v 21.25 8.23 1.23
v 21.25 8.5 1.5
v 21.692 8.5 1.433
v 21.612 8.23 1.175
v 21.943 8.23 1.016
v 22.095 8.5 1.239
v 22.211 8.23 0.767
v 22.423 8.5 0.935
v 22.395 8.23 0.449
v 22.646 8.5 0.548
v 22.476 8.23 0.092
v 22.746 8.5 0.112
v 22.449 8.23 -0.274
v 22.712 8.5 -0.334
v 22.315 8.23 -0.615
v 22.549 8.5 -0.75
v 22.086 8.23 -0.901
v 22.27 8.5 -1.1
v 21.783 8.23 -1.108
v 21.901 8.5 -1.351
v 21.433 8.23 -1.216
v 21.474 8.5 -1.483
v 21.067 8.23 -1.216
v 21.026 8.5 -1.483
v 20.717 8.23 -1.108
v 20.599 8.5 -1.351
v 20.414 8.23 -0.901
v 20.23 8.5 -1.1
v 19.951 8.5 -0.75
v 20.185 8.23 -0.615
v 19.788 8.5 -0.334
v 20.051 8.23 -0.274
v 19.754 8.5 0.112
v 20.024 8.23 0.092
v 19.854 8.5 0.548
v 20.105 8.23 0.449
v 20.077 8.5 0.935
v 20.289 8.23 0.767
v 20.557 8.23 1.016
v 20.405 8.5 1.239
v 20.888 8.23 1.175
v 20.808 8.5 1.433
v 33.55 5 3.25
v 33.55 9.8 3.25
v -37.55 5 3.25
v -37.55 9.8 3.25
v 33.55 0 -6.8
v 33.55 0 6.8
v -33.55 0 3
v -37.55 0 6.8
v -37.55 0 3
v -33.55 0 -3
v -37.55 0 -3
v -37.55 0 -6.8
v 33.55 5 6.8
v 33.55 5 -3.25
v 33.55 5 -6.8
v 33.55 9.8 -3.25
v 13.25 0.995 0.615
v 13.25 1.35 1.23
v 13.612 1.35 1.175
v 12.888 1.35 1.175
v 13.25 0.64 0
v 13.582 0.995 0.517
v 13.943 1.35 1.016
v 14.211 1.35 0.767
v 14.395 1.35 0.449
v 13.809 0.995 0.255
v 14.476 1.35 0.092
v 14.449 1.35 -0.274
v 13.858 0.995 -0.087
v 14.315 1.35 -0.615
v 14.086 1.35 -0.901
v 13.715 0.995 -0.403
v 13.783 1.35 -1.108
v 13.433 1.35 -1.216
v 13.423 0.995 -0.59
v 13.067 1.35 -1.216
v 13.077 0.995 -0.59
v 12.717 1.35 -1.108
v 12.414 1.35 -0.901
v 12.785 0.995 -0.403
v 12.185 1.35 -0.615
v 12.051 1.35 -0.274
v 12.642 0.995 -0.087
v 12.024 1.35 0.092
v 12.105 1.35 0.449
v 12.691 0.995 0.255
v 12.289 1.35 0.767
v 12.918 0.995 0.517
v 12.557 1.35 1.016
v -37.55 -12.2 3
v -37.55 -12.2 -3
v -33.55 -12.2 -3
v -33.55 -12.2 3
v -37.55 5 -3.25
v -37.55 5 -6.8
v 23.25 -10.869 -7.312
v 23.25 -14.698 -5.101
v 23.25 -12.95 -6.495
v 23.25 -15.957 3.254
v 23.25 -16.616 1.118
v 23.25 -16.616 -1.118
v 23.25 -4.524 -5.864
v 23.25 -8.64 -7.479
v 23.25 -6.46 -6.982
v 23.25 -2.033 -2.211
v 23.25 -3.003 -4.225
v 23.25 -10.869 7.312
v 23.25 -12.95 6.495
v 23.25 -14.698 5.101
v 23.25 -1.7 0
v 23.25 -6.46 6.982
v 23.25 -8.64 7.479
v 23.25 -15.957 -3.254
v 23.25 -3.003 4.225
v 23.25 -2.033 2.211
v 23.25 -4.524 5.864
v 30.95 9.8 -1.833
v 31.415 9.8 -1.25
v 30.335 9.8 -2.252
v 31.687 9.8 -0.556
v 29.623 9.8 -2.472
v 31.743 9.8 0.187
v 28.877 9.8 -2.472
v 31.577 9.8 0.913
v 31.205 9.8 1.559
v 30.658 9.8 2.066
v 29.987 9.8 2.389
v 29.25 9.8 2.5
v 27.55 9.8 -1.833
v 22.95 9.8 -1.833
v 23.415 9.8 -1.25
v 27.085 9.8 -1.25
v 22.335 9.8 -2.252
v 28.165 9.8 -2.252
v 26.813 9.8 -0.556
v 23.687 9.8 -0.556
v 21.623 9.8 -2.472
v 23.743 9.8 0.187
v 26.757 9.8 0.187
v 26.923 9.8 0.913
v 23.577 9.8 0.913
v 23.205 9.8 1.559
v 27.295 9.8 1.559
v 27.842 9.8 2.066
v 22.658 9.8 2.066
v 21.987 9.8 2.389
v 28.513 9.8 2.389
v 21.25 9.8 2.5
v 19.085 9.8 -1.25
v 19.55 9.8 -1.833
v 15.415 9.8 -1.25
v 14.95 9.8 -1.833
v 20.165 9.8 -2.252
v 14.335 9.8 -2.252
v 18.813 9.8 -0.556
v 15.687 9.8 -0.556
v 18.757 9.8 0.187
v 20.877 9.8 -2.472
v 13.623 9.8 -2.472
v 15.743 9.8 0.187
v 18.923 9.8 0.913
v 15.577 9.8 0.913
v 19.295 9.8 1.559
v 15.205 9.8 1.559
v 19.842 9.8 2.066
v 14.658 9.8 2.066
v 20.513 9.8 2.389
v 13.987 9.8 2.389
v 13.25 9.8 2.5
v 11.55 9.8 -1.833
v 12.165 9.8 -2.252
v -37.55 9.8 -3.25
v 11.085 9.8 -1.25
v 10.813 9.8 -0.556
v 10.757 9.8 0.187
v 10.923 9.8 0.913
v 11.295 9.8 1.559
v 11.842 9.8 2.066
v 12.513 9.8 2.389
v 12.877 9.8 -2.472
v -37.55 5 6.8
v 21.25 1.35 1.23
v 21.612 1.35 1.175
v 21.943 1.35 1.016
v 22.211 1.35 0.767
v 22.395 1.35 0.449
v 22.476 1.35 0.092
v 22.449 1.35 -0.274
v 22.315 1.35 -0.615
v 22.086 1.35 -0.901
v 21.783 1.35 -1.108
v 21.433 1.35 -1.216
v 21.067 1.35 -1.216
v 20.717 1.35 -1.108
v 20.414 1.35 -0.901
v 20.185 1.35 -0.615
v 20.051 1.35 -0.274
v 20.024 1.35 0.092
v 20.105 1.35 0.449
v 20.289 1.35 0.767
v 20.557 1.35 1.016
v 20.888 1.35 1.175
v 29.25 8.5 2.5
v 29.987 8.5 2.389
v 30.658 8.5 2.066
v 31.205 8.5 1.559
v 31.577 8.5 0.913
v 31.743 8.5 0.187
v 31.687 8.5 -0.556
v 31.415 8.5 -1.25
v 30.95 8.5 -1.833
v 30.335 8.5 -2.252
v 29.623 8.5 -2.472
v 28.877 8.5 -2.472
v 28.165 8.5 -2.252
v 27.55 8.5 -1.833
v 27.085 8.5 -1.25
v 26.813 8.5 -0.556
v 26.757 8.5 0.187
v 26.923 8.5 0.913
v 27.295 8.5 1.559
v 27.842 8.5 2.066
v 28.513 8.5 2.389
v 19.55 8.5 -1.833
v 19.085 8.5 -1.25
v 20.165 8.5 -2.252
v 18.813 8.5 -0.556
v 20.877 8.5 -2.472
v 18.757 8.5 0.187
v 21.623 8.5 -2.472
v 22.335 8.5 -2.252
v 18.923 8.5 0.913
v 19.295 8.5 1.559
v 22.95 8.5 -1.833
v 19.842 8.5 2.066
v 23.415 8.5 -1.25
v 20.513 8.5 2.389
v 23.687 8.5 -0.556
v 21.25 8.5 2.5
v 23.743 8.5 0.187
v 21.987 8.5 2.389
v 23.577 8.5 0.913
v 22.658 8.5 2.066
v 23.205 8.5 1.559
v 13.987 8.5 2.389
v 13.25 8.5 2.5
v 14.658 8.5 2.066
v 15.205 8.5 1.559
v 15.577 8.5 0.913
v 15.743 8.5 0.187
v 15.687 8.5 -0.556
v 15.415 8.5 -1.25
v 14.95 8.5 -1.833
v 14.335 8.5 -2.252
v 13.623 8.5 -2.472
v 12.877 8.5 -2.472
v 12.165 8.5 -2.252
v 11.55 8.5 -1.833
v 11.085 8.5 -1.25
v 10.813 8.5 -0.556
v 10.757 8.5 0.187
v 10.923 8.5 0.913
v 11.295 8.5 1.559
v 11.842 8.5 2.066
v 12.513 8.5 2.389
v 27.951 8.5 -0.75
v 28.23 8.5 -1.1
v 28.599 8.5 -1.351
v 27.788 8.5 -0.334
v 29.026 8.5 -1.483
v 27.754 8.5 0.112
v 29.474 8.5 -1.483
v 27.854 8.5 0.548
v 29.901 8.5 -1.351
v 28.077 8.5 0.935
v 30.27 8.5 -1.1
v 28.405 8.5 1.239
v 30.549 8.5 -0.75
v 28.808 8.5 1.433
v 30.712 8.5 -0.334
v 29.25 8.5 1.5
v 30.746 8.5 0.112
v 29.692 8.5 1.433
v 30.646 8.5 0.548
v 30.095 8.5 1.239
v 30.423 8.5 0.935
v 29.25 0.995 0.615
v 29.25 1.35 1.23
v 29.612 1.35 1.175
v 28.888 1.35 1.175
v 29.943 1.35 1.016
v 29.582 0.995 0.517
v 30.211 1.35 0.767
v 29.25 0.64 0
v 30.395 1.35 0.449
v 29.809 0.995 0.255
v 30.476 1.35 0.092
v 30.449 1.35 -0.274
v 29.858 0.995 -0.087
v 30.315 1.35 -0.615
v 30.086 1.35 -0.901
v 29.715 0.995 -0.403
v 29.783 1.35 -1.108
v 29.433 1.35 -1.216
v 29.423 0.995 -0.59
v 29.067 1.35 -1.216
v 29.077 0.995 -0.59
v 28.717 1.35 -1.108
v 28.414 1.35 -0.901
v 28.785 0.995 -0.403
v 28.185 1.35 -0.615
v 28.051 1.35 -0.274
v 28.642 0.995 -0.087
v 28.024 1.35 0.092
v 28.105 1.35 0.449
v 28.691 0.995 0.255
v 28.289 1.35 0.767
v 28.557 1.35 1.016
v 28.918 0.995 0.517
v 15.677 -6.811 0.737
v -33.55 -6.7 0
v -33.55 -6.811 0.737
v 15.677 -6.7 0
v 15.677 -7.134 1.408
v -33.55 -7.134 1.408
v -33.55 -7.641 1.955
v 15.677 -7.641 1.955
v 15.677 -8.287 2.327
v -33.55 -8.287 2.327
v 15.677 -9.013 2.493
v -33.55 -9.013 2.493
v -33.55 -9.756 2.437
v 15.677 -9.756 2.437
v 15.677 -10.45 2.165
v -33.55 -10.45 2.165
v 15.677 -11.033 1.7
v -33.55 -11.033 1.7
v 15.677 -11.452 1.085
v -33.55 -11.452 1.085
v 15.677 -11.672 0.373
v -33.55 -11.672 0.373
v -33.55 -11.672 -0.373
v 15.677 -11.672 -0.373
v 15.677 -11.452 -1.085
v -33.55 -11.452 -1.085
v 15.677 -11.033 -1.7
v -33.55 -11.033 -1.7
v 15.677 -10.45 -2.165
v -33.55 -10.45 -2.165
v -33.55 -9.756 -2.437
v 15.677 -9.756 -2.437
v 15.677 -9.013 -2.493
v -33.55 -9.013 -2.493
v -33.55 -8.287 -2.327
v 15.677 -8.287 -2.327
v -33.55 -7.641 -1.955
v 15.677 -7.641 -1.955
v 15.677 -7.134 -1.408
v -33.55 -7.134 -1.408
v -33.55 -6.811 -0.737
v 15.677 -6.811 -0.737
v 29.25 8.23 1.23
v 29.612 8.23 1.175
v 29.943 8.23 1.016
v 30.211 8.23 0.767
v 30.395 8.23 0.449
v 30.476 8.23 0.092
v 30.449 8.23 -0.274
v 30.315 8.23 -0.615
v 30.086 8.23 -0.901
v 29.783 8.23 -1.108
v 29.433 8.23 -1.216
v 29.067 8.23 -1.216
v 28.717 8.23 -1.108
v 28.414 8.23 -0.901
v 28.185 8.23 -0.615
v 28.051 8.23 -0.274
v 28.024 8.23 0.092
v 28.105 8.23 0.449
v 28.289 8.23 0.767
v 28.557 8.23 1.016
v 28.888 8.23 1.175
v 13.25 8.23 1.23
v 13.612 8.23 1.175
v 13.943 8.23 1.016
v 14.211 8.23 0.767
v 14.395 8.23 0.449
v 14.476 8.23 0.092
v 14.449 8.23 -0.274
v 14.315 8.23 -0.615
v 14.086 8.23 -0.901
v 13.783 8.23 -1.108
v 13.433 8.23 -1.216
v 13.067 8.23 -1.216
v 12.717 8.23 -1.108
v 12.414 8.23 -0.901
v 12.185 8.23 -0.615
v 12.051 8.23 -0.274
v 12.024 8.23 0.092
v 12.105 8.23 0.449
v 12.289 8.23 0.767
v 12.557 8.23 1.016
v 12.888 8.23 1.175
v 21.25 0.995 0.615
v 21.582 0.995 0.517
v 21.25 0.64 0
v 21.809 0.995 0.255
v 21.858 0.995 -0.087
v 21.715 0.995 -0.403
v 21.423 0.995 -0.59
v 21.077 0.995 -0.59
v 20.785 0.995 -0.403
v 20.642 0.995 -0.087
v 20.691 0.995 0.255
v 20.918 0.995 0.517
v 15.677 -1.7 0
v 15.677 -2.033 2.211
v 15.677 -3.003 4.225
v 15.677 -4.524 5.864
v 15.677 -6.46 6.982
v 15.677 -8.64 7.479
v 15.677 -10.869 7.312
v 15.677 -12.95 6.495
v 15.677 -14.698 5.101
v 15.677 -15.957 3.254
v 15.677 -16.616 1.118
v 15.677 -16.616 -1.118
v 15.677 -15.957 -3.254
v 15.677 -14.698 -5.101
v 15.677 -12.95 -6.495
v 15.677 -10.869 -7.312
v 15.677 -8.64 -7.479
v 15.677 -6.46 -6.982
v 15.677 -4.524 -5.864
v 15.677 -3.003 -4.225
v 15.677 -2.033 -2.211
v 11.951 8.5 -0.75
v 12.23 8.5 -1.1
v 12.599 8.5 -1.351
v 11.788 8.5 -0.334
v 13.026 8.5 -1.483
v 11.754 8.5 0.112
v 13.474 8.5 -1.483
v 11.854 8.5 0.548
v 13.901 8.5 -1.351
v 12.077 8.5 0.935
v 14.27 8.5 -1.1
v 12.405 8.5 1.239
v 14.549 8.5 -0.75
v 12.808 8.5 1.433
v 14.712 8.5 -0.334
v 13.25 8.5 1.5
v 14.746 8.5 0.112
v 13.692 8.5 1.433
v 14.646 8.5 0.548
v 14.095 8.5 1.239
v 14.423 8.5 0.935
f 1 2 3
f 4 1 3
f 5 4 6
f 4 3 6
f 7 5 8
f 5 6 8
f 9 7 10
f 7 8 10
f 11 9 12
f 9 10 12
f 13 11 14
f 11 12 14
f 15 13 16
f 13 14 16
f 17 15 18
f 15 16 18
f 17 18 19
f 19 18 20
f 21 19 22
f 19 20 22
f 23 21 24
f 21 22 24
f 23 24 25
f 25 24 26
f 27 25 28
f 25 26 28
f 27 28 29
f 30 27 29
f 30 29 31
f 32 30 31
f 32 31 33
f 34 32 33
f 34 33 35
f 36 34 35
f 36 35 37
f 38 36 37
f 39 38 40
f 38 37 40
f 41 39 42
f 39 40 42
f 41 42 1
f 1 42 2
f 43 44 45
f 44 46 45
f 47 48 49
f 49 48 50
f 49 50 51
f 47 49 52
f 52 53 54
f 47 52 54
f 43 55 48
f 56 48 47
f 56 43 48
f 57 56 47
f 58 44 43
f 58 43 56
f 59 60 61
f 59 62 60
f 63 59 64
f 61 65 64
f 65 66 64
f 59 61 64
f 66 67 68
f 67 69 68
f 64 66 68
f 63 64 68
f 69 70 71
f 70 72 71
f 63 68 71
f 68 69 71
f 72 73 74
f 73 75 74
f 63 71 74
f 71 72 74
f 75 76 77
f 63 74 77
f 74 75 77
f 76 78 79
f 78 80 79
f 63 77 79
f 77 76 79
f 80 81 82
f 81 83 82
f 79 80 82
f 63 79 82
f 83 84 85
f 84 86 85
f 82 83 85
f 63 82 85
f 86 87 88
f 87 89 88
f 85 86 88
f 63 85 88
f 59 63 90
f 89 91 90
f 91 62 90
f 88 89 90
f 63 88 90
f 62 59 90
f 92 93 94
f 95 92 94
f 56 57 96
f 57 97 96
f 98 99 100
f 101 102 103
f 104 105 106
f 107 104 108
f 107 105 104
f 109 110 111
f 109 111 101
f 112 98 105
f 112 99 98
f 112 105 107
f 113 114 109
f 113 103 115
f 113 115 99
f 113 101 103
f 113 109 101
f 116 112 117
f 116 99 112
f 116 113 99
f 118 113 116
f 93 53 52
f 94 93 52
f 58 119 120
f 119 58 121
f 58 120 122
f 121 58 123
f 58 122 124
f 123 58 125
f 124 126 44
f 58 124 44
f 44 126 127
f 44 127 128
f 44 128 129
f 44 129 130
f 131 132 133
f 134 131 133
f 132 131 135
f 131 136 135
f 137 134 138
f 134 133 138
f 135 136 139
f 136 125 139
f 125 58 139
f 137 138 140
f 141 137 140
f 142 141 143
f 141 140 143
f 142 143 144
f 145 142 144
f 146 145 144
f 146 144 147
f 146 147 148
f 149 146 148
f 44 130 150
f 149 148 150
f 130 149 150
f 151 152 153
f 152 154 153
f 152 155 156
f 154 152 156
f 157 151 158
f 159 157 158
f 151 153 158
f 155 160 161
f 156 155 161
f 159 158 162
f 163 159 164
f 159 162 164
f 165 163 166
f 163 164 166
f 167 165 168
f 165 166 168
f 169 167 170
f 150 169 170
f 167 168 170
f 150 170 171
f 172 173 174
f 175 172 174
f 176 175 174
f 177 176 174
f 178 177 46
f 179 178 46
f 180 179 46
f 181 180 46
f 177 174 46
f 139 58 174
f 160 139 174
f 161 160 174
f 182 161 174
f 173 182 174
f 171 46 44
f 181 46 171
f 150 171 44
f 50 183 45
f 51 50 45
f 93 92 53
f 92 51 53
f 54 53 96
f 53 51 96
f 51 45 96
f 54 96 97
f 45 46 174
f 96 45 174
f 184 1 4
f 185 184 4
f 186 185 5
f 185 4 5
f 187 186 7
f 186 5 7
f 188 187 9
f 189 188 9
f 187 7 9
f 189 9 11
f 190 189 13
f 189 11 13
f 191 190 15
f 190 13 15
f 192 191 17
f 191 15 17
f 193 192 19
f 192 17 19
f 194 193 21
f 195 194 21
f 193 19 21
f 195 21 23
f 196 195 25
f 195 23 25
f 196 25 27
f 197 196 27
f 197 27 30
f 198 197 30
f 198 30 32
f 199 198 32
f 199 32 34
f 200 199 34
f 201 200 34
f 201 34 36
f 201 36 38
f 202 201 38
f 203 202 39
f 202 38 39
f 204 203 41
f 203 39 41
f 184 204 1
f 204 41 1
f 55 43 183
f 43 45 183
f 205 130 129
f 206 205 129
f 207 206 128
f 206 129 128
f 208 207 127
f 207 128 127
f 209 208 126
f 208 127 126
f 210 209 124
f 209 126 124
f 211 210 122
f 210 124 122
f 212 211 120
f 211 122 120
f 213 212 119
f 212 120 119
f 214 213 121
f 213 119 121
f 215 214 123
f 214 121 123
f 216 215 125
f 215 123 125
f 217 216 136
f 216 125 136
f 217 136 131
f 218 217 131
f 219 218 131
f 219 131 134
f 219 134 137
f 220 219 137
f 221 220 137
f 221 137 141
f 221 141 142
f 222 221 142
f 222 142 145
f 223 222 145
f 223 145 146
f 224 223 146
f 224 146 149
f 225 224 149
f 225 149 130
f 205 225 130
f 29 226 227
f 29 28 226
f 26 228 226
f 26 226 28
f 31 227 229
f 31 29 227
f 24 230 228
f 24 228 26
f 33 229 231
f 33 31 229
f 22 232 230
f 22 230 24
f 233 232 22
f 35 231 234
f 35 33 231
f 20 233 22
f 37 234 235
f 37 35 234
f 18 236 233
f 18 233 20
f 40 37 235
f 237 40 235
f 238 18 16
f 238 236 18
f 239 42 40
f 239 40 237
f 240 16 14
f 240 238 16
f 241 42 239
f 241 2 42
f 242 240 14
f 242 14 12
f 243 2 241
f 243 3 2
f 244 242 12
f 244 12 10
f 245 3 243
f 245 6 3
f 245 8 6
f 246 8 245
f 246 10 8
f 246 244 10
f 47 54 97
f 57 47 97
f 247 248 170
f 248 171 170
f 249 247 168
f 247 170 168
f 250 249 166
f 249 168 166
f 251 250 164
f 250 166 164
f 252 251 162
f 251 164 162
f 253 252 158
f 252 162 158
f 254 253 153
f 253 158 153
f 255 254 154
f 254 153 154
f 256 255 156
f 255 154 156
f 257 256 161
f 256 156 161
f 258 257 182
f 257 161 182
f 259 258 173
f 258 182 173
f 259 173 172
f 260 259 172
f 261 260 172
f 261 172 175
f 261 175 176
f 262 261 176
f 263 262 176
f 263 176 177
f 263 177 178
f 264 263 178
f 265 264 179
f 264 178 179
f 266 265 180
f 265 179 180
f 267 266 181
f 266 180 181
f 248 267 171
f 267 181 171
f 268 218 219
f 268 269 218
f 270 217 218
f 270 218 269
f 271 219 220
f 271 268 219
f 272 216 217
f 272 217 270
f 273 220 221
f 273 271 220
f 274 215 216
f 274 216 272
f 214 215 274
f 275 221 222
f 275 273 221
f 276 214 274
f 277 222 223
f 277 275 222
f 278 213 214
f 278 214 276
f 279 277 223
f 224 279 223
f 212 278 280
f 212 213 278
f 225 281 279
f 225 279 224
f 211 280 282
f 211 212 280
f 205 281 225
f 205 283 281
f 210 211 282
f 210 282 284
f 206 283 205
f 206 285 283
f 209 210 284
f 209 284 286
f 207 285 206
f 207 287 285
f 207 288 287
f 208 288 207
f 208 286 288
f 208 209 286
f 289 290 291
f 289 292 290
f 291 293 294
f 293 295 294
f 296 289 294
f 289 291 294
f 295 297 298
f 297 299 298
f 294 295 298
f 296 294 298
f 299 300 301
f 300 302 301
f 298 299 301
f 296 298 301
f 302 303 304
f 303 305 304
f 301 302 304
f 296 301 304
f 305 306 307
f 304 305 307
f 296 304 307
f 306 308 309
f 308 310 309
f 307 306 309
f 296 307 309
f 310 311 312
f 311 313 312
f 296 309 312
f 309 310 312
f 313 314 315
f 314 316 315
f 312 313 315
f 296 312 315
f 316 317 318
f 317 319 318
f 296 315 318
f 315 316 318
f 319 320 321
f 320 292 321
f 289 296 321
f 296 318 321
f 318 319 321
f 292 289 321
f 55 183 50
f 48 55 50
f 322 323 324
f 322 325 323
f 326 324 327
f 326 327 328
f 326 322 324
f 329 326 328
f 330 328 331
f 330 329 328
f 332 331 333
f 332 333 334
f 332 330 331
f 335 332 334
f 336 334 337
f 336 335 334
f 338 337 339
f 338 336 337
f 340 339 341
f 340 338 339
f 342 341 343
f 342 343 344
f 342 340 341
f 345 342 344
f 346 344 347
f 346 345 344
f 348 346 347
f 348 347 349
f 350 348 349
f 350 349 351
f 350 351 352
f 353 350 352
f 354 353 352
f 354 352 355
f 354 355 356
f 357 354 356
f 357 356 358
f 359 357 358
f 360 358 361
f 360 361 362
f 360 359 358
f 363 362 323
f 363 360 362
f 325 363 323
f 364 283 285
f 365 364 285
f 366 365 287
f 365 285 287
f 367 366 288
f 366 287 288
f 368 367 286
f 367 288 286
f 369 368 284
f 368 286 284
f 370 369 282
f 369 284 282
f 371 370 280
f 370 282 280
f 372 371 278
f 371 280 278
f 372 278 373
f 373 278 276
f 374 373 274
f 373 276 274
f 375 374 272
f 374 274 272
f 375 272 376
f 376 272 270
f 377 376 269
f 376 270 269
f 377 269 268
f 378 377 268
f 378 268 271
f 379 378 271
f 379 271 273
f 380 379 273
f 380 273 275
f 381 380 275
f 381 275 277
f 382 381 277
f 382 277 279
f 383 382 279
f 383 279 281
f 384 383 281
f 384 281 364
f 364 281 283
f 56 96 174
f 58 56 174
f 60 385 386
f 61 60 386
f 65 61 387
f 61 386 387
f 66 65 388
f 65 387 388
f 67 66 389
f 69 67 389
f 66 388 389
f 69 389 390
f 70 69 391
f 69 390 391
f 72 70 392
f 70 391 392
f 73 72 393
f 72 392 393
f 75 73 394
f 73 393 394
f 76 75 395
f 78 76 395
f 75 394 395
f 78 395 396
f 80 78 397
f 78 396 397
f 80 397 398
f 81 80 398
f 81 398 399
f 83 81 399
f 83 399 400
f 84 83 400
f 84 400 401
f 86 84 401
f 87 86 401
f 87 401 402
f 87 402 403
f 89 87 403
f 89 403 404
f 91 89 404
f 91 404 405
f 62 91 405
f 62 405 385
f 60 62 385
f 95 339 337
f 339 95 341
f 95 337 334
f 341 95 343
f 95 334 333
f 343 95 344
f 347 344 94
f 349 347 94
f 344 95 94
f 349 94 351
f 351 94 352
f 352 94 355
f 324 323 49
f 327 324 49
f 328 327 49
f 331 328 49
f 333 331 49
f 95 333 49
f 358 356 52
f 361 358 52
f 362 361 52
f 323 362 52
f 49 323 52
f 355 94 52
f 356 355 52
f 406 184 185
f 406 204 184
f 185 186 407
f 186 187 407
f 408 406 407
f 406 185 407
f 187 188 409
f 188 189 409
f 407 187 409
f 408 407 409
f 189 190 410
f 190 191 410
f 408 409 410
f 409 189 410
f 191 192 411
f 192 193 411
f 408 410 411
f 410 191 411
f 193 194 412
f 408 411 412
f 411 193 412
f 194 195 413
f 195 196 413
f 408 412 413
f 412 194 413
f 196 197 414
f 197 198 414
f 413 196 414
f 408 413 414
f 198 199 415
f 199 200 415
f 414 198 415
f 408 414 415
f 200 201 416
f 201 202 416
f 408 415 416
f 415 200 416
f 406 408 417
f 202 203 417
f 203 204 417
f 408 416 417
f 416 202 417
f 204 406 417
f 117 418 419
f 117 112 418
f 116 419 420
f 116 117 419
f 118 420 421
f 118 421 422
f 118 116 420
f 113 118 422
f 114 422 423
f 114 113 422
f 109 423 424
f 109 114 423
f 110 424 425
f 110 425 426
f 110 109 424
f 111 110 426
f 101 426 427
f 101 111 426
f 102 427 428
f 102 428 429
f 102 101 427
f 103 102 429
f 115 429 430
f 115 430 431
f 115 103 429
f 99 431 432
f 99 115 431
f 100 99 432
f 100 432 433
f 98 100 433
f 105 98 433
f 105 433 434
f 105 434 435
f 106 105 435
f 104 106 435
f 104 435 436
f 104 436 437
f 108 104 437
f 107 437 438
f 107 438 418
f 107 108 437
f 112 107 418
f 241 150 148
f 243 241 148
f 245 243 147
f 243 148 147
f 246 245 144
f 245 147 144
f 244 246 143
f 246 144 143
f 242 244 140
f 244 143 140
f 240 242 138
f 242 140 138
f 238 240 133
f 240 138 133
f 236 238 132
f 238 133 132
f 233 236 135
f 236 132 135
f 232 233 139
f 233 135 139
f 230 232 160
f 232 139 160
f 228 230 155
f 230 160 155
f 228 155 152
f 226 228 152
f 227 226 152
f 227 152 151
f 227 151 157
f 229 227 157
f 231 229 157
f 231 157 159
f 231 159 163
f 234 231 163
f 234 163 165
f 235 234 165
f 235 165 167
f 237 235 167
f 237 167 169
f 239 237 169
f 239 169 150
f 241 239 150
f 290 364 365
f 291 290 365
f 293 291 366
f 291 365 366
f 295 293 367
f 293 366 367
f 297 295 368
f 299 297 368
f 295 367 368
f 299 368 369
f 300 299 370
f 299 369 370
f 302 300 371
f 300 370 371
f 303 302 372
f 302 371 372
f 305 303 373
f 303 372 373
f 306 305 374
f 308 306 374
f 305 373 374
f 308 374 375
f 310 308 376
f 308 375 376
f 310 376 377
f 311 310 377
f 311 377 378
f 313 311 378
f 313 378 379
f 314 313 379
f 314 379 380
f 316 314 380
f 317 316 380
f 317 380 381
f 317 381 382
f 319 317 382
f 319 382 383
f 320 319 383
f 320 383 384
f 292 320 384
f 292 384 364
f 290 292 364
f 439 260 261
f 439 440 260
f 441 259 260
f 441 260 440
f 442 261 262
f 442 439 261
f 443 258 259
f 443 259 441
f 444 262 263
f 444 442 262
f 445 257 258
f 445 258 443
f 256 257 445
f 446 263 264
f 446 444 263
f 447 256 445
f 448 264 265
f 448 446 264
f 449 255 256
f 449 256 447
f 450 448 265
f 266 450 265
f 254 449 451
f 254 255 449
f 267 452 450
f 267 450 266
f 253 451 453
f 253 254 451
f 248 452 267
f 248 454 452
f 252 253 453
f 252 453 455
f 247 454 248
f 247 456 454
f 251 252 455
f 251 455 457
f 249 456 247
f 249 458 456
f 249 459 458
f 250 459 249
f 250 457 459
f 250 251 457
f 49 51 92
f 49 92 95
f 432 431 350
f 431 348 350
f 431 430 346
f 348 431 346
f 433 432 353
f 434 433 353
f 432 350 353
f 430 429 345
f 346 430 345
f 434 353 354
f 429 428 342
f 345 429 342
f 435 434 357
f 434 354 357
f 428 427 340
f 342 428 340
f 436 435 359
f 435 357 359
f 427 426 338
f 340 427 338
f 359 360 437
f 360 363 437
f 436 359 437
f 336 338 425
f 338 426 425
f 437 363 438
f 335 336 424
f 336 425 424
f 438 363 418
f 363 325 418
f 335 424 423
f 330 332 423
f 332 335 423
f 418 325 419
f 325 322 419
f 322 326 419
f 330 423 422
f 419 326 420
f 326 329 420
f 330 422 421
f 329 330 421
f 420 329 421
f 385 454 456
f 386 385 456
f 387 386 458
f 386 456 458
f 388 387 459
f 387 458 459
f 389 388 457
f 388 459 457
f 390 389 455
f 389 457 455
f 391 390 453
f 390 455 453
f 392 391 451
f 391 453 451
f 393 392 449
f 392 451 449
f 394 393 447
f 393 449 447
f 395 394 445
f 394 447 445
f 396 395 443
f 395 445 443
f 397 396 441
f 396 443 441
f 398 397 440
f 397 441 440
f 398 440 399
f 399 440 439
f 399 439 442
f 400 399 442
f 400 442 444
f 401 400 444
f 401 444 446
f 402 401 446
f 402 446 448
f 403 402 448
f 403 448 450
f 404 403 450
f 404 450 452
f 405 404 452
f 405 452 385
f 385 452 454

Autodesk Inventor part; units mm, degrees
sketch "Skizze_1" plane through (-37.55, 0, 0) normal (1, 0, 0) x (0, 0, -1)
  line L0 (-6.8, 5) -> (-6.8, 0)
  line L1 (-6.8, 0) -> (6.8, 0)
  line L2 (6.8, 0) -> (6.8, 5)
  line L3 (6.8, 5) -> (3.25, 5)
  line L4 (3.25, 5) -> (3.25, 9.8)
  line L5 (3.25, 9.8) -> (-3.25, 9.8)
  line L6 (-3.25, 9.8) -> (-3.25, 5)
  line L7 (-3.25, 5) -> (-6.8, 5)
extrude "Extrusion1" add sketch "Skizze_1" along normal blind 71.1
sketch "Skizze_2" plane through (0, 0, 0) normal (0, 0, 1) x (1, 0, 0)
  line L0 (-37.55, 7) -> (-37.55, -12.2)
  line L1 (-37.55, -12.2) -> (-33.55, -12.2)
  line L2 (-33.55, -12.2) -> (-33.55, 7)
  line L3 (-33.55, 7) -> (-37.55, 7)
extrude "Extrusion2" add sketch "Skizze_2" along normal mid plane 6
sketch "Sketch_1" plane through (0, 0, 0) normal (0, 0, 1) x (1, 0, 0)
  line L0 (23.25, -9.2) -> (-33.55, -9.2)
  line L1 (-33.55, -9.2) -> (-33.55, -6.7)
  line L2 (-33.55, -6.7) -> (15.6767, -6.7)
  line L3 (15.6767, -6.7) -> (15.6767, -1.7)
  line L4 (15.6767, -1.7) -> (23.25, -1.7)
  line L5 (23.25, -1.7) -> (23.25, -9.2)
  line L6 (23.25, -9.2) -> (-33.55, -9.2)
revolve "Revolution1" add sketch "Sketch_1" angle 360 about axis through (23.25, -9.2, 0) along (1, 0, 0)
sketch "Sketch_3" plane through (29.25, 0, 0) normal (1, 0, 0) x (0, 0, -1)
  line L0 (0, 9.8) -> (0, 0.6401)
  line L1 (0, 0.6401) -> (-1.2295, 1.35)
  line L2 (-1.2295, 1.35) -> (-1.2295, 8.2295)
  line L3 (-1.2295, 8.2295) -> (-1.5, 8.5)
  line L4 (-1.5, 8.5) -> (-2.5, 8.5)
  line L5 (-2.5, 8.5) -> (-2.5, 9.8)
  line L6 (-2.5, 9.8) -> (0, 9.8)
  line L7 (0, 9.8) -> (0, 0.6401)
revolve "Revolution2" cut sketch "Sketch_3" angle 360 about axis through (29.25, 9.8, 0) along (0, 1, 0)
thread "Thread1" size "M3x0.5" class "6H" standard "ISO Metric profile" length 5.2295
pattern_linear "Rectangular Pattern1" count 3 spacing 8 along (-1, 0, 0) of "Revolution2"
ref_plane "ANBAU_XY" through (23.25, -9.2, 0) normal (1, 0, 0) x (0, 0, -1)
ref_plane "ANBAU_YZ" through (23.25, -9.2, 0) normal (0, 0, -1) x (0, 1, 0)
ref_plane "ANBAU_ZX" through (23.25, -9.2, 0) normal (0, 1, 0) x (1, 0, 0)
ref_plane "SCHRAUBE_1_XY" through (29.25, 8.5, 0) normal (0, 1, 0) x (1, 0, 0)
ref_plane "SCHRAUBE_1_YZ" through (29.25, 8.5, 0) normal (1, 0, 0) x (0, 0, -1)
ref_plane "SCHRAUBE_1_ZX" through (29.25, 8.5, 0) normal (0, 0, -1) x (0, 1, 0)
ref_plane "SCHRAUBE_2_XY" through (21.25, 8.5, 0) normal (0, 1, 0) x (1, 0, 0)
ref_plane "SCHRAUBE_2_YZ" through (21.25, 8.5, 0) normal (1, 0, 0) x (0, 0, -1)
ref_plane "SCHRAUBE_2_ZX" through (21.25, 8.5, 0) normal (0, 0, -1) x (0, 1, 0)
ref_plane "SCHRAUBE_3_XY" through (13.25, 8.5, 0) normal (0, 1, 0) x (1, 0, 0)
ref_plane "SCHRAUBE_3_YZ" through (13.25, 8.5, 0) normal (1, 0, 0) x (0, 0, -1)
ref_plane "SCHRAUBE_3_ZX" through (13.25, 8.5, 0) normal (0, 0, -1) x (0, 1, 0)
ref_plane "ZBHJAW1_XY" through (29.25, 8.5, 0) normal (0, -1, 0) x (1, 0, 0)
ref_plane "ZBHJAW1_YZ" through (29.25, 8.5, 0) normal (1, 0, 0) x (0, 0, 1)
ref_plane "ZBHJAW1_ZX" through (29.25, 8.5, 0) normal (0, 0, 1) x (0, -1, 0)
ref_plane "ZBHJAW2_XY" through (13.25, 8.5, 0) normal (0, -1, 0) x (1, 0, 0)
ref_plane "ZBHJAW2_YZ" through (13.25, 8.5, 0) normal (1, 0, 0) x (0, 0, 1)
ref_plane "ZBHJAW2_ZX" through (13.25, 8.5, 0) normal (0, 0, 1) x (0, -1, 0)
properties part number "3385160 HGPL-BAC-14-40---(J)"
